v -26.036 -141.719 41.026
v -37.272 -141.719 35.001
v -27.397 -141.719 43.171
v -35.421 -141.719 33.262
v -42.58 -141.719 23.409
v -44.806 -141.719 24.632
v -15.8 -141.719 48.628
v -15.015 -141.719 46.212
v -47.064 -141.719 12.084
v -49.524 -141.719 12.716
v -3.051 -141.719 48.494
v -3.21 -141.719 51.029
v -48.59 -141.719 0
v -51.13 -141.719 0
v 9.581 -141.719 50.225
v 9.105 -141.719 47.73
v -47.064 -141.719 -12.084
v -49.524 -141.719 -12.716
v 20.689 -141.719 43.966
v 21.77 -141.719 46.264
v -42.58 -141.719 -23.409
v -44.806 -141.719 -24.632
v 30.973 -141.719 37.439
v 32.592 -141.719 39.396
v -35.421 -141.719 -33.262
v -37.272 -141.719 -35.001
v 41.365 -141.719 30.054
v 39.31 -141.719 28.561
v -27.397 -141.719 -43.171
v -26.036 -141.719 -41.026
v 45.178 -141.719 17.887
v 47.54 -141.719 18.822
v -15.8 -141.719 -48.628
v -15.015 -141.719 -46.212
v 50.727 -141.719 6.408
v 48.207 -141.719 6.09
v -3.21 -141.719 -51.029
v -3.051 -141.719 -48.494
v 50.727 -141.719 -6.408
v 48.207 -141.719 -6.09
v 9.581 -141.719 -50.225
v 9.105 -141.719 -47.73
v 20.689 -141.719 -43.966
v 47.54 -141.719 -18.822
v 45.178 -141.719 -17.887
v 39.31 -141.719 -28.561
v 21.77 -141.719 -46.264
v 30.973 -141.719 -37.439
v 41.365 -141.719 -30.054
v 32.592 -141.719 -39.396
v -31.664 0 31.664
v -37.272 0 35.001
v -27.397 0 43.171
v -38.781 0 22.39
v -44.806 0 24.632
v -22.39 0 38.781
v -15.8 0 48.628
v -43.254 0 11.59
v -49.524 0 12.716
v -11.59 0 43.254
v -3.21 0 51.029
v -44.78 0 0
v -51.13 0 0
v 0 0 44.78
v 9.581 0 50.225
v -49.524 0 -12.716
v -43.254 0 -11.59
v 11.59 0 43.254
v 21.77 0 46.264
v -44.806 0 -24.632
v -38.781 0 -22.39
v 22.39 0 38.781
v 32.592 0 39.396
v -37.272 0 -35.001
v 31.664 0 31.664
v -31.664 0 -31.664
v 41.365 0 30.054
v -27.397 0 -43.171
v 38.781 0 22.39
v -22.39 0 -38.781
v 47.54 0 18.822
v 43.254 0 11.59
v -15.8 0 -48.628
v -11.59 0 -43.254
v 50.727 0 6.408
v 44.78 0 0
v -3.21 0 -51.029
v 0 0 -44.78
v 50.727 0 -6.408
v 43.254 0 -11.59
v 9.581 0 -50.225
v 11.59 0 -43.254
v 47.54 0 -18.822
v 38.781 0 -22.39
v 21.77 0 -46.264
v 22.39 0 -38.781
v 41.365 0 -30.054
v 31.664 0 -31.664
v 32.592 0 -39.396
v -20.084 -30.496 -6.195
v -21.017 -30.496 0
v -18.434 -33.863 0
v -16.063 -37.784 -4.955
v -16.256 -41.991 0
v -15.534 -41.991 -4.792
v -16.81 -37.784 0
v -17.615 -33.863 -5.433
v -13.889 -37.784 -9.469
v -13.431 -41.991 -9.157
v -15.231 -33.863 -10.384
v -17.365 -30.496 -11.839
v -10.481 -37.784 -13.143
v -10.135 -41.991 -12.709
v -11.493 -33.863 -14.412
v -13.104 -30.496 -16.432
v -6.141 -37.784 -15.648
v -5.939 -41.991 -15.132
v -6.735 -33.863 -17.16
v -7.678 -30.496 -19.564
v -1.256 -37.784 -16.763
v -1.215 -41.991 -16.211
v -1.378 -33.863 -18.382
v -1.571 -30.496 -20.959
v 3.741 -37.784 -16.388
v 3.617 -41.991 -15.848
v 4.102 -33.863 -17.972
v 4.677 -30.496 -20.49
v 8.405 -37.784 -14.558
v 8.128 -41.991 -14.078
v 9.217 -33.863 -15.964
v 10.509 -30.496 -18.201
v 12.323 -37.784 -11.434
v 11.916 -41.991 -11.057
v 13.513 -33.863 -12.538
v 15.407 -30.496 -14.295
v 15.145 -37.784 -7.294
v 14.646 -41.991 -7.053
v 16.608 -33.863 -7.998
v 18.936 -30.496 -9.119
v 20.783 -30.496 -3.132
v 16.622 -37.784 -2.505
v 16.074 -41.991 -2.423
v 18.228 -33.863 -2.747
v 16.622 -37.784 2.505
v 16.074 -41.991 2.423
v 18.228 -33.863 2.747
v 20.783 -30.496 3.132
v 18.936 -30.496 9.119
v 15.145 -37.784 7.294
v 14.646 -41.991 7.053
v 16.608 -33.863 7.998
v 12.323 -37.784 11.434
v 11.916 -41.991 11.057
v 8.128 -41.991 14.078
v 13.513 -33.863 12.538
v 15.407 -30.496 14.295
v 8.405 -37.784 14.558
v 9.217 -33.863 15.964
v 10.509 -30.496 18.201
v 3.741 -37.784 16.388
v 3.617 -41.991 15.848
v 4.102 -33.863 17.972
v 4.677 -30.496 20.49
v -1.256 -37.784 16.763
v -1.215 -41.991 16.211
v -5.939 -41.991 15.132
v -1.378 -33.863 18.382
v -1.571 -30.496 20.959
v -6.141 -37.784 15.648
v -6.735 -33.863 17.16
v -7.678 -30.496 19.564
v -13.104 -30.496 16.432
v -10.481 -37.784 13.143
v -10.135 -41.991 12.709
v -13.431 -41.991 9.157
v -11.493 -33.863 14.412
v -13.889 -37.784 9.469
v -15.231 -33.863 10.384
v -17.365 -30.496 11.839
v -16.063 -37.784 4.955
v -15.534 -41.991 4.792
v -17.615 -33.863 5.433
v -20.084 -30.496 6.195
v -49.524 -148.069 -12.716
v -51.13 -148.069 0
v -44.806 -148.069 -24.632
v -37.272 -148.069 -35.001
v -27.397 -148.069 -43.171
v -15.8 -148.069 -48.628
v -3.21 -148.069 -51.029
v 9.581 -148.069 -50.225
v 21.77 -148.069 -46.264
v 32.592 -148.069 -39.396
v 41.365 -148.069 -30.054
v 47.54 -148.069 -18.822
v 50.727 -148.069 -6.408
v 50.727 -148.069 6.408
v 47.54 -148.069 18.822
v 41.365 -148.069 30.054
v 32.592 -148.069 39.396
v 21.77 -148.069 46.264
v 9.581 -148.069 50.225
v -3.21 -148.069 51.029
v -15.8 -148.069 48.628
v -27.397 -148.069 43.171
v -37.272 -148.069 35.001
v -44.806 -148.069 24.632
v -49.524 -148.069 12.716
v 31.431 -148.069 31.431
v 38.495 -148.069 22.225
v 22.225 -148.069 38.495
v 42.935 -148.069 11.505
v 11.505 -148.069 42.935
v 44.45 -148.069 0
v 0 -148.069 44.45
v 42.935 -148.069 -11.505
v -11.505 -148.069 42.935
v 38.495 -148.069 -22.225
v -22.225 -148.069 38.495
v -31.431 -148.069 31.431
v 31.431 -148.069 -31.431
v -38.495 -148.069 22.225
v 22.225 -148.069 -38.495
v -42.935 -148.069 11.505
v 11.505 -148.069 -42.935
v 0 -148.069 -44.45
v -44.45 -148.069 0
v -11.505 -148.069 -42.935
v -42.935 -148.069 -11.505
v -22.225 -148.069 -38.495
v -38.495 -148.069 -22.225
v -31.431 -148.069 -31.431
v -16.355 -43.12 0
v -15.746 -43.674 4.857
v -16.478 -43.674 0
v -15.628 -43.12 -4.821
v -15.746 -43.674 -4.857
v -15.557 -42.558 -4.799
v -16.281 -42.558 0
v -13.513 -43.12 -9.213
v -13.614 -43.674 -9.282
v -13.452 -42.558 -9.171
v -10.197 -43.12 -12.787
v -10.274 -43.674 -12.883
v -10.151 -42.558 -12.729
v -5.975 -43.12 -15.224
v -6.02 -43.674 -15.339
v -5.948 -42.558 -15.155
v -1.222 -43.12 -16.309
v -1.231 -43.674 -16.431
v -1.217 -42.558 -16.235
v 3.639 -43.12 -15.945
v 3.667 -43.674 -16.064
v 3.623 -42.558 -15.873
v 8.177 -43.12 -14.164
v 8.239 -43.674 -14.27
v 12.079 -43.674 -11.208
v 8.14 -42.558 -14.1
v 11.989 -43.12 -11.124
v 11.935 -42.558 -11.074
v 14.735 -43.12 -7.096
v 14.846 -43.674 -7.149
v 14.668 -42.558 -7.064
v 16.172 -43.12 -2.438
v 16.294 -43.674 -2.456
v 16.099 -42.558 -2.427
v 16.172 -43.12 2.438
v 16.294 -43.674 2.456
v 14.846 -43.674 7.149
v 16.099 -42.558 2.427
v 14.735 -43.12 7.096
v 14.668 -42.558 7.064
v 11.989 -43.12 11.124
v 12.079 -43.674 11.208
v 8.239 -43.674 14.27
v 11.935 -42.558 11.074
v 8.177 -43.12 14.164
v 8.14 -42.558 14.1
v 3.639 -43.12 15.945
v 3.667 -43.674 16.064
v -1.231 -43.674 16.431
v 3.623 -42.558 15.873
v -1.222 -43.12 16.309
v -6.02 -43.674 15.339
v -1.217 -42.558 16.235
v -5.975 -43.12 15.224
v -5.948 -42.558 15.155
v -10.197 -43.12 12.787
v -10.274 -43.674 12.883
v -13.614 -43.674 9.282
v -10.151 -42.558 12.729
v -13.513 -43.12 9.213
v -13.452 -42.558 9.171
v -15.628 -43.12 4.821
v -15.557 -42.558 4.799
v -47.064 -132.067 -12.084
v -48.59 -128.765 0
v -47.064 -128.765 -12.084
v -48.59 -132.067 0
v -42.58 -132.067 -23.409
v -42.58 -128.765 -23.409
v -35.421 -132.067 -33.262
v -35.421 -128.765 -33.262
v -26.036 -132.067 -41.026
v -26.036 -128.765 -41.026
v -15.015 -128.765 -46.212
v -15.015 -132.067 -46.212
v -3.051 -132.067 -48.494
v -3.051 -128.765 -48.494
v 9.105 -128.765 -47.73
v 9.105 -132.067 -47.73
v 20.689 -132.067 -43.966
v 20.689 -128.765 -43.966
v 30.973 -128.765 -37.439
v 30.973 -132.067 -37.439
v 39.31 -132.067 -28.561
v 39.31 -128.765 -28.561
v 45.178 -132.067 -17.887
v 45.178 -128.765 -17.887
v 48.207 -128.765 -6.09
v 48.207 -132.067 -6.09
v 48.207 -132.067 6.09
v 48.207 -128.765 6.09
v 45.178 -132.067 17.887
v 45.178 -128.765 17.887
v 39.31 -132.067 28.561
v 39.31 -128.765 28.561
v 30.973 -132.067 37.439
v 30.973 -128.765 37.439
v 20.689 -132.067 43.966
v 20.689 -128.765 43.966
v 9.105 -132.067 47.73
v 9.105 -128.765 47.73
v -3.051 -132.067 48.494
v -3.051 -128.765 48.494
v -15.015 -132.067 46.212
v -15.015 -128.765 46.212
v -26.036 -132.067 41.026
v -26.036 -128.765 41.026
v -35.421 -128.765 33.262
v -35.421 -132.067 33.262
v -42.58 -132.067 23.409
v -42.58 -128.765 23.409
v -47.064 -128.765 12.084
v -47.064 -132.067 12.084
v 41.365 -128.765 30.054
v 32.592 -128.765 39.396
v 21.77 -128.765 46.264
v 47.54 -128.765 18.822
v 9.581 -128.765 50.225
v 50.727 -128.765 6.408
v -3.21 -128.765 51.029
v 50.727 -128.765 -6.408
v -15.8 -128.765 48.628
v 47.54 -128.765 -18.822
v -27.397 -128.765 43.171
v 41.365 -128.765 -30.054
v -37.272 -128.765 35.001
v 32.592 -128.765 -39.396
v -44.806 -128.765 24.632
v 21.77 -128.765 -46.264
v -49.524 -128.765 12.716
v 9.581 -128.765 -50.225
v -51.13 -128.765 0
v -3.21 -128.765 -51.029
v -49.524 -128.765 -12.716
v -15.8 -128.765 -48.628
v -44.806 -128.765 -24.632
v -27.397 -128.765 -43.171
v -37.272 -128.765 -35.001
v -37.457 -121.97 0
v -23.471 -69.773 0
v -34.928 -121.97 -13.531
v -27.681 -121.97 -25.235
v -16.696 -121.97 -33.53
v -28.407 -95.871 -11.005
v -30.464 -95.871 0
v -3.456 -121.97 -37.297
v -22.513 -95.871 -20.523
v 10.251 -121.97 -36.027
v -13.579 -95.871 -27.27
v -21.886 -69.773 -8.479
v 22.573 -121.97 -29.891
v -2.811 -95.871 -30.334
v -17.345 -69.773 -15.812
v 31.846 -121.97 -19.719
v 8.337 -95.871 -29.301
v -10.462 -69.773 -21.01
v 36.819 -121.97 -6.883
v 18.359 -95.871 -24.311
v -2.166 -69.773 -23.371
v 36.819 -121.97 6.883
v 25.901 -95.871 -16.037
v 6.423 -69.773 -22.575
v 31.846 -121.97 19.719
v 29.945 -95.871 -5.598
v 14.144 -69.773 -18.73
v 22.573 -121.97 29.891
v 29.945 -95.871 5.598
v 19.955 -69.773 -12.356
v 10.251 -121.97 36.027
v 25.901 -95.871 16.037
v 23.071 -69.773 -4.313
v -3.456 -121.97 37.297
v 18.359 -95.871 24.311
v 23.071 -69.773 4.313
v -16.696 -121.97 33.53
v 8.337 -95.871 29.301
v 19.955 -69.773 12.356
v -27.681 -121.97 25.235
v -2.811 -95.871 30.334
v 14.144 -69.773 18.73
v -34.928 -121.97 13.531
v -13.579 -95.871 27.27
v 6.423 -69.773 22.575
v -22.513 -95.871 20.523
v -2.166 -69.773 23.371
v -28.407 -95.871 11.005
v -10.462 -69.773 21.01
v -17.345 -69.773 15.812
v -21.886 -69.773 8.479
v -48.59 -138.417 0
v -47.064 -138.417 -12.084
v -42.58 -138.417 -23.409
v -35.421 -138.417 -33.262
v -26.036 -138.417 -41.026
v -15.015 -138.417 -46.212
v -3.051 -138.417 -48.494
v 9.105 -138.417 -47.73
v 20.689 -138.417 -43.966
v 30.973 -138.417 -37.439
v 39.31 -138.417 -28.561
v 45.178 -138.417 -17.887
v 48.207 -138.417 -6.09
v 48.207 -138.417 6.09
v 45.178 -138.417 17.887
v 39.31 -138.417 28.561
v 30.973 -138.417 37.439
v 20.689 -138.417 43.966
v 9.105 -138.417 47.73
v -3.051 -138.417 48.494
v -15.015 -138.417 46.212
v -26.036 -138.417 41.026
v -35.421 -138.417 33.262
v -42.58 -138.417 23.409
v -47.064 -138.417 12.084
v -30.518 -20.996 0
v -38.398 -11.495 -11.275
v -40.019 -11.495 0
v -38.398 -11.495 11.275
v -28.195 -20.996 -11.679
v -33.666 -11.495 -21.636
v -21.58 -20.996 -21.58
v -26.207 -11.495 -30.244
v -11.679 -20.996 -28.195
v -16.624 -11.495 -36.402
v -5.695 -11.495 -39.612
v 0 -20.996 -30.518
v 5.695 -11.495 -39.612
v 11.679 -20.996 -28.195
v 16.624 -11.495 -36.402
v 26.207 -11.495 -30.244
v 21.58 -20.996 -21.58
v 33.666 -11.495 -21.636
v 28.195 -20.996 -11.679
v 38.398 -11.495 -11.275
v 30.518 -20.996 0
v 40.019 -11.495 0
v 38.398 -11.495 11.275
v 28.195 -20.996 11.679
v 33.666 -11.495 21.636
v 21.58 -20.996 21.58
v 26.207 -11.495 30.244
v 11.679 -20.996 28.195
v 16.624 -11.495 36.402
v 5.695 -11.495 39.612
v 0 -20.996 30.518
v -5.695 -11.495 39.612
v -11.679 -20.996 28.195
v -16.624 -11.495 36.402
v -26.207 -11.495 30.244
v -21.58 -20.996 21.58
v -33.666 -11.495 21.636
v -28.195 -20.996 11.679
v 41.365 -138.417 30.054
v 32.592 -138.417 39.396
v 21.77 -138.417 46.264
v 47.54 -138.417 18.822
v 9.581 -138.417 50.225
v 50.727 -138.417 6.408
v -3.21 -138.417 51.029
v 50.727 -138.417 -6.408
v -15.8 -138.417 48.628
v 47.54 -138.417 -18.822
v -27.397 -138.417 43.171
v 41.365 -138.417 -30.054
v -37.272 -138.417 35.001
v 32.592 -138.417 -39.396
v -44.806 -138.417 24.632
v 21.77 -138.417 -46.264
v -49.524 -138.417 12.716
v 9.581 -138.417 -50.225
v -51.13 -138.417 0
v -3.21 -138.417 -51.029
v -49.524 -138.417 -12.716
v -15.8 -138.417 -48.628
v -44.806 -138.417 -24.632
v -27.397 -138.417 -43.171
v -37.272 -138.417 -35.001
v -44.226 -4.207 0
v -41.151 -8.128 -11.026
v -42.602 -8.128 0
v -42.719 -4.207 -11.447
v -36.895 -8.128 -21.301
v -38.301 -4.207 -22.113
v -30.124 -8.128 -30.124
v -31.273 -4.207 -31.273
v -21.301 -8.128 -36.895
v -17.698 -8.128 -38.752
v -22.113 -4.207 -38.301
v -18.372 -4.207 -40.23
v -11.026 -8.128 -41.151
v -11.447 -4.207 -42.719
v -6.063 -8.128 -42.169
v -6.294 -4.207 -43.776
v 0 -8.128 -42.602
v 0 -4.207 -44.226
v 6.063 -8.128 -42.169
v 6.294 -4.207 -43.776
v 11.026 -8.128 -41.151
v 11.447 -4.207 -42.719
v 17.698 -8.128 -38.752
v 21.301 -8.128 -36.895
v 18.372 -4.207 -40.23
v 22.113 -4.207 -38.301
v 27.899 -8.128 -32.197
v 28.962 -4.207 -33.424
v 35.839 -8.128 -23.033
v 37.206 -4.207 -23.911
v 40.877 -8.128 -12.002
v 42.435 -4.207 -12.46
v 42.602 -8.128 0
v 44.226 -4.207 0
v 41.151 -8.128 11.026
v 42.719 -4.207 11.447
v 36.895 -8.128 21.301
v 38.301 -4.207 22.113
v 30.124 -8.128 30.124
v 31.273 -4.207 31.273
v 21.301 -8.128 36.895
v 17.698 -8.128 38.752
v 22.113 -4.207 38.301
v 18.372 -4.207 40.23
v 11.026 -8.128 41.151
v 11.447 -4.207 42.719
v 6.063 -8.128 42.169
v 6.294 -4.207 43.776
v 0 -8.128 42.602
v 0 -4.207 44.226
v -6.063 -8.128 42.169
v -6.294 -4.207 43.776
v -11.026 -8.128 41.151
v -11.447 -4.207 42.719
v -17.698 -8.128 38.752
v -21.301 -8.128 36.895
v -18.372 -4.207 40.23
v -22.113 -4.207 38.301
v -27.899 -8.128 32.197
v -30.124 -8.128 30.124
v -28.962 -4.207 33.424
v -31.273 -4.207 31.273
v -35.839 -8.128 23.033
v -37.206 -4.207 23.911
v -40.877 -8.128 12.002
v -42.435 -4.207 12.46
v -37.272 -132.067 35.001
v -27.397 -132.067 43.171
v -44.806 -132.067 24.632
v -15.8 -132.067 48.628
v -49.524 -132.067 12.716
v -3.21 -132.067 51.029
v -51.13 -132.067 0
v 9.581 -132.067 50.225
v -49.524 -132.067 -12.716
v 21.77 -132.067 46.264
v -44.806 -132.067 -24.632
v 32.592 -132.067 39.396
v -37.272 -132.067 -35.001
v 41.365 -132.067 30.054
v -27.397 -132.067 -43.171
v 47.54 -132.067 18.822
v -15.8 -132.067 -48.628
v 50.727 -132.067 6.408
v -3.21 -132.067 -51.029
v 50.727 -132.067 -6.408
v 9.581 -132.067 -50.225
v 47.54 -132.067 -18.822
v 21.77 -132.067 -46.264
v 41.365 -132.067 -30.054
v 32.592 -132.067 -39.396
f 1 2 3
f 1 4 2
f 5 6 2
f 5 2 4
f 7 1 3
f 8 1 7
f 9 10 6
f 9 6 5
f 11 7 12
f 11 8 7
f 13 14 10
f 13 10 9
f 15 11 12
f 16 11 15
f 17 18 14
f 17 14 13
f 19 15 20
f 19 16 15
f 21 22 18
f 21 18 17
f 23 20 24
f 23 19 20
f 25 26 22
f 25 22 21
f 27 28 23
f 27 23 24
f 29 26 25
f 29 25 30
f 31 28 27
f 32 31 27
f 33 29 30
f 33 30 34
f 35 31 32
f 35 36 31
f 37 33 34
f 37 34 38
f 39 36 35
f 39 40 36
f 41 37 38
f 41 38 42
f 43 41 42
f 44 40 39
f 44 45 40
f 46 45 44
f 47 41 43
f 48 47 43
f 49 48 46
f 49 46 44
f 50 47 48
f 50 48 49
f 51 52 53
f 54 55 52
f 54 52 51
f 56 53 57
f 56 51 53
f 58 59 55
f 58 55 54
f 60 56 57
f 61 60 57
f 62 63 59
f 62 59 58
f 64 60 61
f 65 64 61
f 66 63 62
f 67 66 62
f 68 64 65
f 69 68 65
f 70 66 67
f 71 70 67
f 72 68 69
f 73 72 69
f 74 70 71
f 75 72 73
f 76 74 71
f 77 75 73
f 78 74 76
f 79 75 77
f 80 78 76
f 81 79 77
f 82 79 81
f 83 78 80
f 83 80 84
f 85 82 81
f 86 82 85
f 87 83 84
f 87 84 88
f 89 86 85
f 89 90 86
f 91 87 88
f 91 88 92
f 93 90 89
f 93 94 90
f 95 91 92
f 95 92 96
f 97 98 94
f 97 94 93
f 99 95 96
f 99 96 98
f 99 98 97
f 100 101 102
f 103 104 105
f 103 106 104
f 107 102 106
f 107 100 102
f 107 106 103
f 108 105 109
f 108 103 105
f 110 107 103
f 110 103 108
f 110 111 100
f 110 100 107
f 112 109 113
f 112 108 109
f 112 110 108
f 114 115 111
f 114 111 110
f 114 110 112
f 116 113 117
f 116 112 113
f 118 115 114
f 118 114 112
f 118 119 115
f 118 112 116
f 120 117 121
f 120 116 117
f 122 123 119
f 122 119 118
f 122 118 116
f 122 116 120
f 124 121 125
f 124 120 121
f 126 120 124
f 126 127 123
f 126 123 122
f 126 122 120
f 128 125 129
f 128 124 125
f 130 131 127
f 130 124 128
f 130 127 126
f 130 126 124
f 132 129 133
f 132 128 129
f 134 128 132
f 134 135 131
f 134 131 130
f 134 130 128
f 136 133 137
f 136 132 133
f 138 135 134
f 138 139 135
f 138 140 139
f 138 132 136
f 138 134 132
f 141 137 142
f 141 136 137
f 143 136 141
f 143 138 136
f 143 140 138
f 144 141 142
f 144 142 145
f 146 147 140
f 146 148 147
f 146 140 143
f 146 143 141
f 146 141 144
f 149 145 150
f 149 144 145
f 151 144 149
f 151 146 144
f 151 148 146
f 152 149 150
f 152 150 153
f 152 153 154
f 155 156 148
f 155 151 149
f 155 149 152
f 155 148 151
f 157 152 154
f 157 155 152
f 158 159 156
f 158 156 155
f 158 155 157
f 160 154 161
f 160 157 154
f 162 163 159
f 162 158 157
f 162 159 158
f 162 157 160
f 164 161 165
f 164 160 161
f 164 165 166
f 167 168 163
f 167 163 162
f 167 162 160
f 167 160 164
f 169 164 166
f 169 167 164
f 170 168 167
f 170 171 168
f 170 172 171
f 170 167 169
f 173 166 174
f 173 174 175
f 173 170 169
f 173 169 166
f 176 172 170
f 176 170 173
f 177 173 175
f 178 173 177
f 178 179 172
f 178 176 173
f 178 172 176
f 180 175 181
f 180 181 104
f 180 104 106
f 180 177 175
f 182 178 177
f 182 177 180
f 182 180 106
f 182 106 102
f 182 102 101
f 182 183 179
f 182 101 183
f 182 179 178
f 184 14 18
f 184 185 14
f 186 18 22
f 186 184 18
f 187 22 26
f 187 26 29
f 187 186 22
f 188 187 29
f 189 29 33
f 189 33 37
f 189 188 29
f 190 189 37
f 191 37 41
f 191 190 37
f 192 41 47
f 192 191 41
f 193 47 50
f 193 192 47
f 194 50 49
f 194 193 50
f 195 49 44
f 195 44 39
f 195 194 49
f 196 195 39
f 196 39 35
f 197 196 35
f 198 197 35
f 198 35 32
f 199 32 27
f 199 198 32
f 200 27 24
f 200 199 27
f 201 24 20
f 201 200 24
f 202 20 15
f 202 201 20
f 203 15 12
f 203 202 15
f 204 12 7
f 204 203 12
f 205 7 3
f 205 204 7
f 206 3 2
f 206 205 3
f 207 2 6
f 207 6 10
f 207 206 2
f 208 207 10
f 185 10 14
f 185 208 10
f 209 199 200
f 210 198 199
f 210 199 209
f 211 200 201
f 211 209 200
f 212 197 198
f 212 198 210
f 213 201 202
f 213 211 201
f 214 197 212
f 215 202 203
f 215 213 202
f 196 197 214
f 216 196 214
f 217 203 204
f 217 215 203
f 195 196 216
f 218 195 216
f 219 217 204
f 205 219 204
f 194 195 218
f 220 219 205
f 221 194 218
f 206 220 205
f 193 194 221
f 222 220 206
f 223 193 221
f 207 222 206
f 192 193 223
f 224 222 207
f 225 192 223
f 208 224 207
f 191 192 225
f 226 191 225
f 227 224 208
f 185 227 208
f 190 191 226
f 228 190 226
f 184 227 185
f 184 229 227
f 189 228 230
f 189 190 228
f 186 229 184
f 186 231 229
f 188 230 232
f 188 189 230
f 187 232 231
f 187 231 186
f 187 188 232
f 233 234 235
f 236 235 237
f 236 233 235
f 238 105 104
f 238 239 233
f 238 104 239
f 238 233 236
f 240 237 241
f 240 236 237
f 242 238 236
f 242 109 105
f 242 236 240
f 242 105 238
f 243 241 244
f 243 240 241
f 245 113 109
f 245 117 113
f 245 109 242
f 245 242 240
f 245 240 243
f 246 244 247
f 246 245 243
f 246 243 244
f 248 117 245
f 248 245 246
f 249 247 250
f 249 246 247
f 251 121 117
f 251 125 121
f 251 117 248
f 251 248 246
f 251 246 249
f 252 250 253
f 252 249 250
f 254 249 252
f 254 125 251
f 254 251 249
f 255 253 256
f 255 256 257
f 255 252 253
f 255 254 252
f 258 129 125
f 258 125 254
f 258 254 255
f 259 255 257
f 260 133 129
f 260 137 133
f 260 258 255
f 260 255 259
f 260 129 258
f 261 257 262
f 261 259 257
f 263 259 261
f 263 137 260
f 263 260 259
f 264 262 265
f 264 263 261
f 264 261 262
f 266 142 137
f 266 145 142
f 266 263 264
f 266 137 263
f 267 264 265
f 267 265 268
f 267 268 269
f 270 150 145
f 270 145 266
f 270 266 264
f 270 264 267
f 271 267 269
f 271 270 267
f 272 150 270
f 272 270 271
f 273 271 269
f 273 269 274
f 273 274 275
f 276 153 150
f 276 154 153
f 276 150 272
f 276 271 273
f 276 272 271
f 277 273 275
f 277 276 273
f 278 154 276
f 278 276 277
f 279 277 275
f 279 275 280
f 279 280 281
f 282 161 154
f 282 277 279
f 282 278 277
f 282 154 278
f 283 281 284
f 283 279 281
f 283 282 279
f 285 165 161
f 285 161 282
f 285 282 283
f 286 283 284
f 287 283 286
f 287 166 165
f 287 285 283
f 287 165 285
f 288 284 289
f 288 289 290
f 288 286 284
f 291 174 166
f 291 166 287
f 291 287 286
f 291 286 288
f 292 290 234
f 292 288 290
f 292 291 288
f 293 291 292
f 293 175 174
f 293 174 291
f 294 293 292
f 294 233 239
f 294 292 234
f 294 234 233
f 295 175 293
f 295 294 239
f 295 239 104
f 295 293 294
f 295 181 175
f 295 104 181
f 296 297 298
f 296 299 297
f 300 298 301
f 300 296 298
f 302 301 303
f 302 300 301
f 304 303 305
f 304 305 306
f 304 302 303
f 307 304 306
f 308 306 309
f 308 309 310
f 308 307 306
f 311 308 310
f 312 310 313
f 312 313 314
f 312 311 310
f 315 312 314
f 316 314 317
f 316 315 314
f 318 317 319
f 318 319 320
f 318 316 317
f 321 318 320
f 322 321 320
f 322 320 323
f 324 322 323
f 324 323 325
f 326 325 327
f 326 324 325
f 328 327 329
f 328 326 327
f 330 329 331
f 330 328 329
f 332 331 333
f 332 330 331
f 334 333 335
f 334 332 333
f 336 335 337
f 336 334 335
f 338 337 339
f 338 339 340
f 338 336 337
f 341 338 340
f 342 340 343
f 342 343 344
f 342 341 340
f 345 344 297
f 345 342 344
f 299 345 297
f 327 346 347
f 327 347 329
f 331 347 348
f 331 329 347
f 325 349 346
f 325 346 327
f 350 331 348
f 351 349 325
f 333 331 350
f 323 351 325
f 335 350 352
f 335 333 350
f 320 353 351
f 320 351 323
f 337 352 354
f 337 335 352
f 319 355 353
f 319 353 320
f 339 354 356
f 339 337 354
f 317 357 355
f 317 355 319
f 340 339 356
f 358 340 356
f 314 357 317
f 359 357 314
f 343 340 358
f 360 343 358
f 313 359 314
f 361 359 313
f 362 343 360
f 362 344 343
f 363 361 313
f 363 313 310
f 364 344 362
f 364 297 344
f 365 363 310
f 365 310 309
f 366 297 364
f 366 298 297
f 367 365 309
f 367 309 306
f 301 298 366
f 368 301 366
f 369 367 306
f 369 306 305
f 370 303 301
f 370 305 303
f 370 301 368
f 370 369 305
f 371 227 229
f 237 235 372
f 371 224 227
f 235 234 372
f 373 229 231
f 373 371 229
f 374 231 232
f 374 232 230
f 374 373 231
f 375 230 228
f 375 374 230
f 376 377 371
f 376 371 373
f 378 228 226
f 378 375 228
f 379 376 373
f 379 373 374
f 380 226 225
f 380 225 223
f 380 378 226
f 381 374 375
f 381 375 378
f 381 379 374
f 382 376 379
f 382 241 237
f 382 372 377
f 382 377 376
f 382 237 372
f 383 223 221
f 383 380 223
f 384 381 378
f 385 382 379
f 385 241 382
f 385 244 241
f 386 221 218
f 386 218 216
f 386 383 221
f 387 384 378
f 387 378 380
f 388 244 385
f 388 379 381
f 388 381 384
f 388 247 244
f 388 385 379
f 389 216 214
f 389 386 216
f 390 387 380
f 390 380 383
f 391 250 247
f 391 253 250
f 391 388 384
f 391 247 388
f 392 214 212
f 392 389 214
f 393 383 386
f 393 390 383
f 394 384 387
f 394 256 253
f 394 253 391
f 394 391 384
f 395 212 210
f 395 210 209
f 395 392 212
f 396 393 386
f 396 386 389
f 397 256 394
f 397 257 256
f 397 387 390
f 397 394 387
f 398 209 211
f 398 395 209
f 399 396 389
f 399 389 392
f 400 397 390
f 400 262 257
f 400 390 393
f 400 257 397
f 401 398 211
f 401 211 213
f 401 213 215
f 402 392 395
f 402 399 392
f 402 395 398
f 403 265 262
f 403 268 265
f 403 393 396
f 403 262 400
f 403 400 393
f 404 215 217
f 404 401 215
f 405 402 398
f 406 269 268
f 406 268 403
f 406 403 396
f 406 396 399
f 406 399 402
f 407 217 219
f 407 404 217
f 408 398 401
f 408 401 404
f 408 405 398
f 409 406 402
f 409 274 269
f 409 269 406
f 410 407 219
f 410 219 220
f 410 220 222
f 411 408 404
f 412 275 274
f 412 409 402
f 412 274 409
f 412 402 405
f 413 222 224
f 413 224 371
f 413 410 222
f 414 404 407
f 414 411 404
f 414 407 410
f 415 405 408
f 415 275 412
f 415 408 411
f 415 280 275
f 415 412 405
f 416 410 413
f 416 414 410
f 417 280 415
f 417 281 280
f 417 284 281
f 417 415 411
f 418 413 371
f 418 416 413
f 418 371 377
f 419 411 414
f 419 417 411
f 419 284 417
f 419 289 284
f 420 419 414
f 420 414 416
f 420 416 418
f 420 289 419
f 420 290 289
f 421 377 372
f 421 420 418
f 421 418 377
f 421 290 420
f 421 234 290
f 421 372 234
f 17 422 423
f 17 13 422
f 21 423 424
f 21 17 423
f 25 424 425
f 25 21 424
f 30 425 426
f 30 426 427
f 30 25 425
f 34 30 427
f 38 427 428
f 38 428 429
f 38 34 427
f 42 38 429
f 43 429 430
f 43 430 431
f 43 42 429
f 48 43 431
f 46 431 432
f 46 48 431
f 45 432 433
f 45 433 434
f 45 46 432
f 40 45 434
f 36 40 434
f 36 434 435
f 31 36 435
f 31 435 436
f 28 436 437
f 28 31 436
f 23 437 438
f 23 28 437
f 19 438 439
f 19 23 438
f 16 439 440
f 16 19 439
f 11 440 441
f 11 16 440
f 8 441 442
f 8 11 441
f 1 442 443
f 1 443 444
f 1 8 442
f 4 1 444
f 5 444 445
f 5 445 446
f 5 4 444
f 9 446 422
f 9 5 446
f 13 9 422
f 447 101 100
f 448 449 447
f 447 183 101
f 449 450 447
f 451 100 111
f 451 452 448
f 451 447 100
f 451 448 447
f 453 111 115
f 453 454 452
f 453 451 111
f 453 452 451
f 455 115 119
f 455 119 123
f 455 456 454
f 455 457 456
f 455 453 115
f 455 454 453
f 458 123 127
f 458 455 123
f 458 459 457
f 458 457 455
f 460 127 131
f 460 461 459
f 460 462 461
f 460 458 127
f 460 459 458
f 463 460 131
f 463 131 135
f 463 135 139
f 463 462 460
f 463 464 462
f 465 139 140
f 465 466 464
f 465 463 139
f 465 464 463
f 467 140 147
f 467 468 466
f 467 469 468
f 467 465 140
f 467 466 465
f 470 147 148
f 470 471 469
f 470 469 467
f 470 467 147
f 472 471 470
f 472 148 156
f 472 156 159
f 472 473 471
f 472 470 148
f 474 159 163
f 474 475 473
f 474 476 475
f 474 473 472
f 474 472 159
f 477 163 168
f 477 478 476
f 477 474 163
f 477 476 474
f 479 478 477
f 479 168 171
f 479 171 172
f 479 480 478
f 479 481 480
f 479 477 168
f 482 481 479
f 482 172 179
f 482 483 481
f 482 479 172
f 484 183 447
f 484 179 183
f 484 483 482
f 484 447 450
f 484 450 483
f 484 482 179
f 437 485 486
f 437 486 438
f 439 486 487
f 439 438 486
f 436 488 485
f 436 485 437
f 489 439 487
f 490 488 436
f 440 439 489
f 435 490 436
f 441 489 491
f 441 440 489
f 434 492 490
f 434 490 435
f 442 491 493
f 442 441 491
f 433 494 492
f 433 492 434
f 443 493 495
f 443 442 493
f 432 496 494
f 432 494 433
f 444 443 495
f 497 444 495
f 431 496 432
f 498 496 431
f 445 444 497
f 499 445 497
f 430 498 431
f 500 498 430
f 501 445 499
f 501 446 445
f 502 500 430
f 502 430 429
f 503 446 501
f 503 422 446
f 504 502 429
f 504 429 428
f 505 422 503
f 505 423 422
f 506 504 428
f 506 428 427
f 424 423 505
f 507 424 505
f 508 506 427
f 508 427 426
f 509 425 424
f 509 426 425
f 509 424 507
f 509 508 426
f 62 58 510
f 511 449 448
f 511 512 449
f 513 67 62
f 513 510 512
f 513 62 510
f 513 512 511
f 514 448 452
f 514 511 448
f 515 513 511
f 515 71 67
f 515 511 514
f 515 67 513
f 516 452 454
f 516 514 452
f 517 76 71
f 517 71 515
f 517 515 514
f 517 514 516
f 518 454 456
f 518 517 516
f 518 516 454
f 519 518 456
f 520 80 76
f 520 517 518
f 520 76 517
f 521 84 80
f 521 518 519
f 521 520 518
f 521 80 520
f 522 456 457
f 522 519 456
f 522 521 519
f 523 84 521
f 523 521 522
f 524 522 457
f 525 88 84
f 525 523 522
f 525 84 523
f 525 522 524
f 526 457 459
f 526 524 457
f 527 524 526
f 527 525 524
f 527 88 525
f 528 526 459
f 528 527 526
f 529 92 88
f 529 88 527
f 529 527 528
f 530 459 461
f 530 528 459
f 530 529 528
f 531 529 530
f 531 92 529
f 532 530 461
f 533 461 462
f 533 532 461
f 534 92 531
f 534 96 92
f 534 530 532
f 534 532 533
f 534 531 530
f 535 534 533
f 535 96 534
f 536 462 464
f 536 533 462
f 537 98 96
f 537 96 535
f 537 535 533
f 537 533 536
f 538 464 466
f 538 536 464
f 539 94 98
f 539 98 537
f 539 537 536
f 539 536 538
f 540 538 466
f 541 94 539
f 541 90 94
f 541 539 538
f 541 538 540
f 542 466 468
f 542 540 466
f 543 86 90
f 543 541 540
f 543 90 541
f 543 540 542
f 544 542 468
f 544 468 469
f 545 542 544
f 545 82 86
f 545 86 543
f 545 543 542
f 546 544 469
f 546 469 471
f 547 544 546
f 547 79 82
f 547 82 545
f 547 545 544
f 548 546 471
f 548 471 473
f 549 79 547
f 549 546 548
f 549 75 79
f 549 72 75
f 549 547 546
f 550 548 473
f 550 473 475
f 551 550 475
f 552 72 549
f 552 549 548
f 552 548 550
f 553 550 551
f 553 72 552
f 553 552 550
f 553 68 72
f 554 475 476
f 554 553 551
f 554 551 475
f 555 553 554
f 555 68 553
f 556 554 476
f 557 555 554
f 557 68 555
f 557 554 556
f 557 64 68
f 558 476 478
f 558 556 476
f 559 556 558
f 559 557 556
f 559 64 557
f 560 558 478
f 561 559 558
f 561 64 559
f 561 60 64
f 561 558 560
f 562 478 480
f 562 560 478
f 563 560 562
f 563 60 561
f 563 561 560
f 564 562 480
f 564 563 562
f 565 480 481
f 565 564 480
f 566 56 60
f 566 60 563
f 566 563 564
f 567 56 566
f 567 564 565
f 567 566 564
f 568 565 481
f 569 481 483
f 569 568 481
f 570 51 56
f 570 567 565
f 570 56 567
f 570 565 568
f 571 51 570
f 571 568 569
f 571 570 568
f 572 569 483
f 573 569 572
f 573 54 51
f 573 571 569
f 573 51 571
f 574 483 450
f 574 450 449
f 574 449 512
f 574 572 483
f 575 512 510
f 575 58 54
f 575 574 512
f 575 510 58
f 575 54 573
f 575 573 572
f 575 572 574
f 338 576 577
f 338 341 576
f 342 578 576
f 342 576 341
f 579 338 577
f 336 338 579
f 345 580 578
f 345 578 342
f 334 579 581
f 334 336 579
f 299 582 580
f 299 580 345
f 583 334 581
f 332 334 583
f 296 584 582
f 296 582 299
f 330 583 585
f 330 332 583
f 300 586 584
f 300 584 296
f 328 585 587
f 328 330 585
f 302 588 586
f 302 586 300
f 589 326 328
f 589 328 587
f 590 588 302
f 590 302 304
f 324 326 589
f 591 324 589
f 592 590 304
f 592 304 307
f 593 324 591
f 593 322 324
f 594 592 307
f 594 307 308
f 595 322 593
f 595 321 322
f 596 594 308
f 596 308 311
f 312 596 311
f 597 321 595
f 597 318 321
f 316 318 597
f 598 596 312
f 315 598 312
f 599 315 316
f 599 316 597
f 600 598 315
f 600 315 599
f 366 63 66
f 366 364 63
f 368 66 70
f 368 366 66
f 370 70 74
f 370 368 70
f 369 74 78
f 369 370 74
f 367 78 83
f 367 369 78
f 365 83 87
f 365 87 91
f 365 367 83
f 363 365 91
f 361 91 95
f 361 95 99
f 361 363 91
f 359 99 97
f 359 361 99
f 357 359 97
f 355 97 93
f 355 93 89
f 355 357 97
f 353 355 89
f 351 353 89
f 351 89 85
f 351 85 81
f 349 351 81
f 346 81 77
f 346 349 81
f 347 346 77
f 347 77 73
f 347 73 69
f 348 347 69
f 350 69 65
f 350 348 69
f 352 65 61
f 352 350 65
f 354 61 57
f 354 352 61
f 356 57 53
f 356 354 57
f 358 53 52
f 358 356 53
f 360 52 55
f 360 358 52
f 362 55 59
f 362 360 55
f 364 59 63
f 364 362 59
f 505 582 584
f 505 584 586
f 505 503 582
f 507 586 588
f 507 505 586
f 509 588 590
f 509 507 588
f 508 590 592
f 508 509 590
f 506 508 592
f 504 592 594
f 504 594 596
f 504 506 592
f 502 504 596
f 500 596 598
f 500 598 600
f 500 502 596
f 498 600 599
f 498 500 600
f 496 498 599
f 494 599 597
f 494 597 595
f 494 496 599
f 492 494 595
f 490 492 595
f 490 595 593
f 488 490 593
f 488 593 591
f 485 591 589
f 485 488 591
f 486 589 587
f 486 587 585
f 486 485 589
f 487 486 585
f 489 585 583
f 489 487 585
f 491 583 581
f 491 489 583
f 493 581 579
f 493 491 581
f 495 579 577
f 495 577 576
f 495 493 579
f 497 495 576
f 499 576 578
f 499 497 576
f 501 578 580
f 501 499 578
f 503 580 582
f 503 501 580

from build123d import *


with BuildPart() as part:
    # Sketch1 → Revolve1 (revolve)
    with BuildSketch(Plane.XY):
        with BuildLine():
            Line((-51.1302, 0), (-51.1302, -128.764609009))
            Line((-51.1302, -128.764609009), (-48.5902, -128.764609009))
            Line((-48.5902, -128.764609009), (-48.5902, -132.066609009))
            Line((-48.5902, -132.066609009), (-51.1302, -132.066609009))
            Line((-51.1302, -132.066609009), (-51.1302, -138.416609009))
            Line((-51.1302, -138.416609009), (-48.5902, -138.416609009))
            Line((-48.5902, -138.416609009), (-48.5902, -141.718609009))
            Line((-48.5902, -141.718609009), (-51.1302, -141.718609009))
            Line((-51.1302, -141.718609009), (-51.1302, -148.068609009))
            Line((-51.1302, -148.068609009), (-44.45, -148.068609009))
            Line((-44.45, -148.068609009), (-16.477563907, -43.674056299))
            ThreePointArc((-16.477563907, -43.674056299), (-16.311628933, -42.839844852), (-16.256, -41.99111134))
            ThreePointArc((-16.256, -41.99111134), (-17.493414319, -35.770209463), (-21.017272165, -30.496383505))
            Line((-21.017272165, -30.496383505), (-40.018927835, -11.494727835))
            ThreePointArc((-40.018927835, -11.494727835), (-43.542785681, -6.220901877), (-44.7802, 0))
            Line((-44.7802, 0), (-51.1302, 0))
        make_face()
    revolve(axis=Axis((0, 0, 0), (0, -1, 0)))


solid = part.part
